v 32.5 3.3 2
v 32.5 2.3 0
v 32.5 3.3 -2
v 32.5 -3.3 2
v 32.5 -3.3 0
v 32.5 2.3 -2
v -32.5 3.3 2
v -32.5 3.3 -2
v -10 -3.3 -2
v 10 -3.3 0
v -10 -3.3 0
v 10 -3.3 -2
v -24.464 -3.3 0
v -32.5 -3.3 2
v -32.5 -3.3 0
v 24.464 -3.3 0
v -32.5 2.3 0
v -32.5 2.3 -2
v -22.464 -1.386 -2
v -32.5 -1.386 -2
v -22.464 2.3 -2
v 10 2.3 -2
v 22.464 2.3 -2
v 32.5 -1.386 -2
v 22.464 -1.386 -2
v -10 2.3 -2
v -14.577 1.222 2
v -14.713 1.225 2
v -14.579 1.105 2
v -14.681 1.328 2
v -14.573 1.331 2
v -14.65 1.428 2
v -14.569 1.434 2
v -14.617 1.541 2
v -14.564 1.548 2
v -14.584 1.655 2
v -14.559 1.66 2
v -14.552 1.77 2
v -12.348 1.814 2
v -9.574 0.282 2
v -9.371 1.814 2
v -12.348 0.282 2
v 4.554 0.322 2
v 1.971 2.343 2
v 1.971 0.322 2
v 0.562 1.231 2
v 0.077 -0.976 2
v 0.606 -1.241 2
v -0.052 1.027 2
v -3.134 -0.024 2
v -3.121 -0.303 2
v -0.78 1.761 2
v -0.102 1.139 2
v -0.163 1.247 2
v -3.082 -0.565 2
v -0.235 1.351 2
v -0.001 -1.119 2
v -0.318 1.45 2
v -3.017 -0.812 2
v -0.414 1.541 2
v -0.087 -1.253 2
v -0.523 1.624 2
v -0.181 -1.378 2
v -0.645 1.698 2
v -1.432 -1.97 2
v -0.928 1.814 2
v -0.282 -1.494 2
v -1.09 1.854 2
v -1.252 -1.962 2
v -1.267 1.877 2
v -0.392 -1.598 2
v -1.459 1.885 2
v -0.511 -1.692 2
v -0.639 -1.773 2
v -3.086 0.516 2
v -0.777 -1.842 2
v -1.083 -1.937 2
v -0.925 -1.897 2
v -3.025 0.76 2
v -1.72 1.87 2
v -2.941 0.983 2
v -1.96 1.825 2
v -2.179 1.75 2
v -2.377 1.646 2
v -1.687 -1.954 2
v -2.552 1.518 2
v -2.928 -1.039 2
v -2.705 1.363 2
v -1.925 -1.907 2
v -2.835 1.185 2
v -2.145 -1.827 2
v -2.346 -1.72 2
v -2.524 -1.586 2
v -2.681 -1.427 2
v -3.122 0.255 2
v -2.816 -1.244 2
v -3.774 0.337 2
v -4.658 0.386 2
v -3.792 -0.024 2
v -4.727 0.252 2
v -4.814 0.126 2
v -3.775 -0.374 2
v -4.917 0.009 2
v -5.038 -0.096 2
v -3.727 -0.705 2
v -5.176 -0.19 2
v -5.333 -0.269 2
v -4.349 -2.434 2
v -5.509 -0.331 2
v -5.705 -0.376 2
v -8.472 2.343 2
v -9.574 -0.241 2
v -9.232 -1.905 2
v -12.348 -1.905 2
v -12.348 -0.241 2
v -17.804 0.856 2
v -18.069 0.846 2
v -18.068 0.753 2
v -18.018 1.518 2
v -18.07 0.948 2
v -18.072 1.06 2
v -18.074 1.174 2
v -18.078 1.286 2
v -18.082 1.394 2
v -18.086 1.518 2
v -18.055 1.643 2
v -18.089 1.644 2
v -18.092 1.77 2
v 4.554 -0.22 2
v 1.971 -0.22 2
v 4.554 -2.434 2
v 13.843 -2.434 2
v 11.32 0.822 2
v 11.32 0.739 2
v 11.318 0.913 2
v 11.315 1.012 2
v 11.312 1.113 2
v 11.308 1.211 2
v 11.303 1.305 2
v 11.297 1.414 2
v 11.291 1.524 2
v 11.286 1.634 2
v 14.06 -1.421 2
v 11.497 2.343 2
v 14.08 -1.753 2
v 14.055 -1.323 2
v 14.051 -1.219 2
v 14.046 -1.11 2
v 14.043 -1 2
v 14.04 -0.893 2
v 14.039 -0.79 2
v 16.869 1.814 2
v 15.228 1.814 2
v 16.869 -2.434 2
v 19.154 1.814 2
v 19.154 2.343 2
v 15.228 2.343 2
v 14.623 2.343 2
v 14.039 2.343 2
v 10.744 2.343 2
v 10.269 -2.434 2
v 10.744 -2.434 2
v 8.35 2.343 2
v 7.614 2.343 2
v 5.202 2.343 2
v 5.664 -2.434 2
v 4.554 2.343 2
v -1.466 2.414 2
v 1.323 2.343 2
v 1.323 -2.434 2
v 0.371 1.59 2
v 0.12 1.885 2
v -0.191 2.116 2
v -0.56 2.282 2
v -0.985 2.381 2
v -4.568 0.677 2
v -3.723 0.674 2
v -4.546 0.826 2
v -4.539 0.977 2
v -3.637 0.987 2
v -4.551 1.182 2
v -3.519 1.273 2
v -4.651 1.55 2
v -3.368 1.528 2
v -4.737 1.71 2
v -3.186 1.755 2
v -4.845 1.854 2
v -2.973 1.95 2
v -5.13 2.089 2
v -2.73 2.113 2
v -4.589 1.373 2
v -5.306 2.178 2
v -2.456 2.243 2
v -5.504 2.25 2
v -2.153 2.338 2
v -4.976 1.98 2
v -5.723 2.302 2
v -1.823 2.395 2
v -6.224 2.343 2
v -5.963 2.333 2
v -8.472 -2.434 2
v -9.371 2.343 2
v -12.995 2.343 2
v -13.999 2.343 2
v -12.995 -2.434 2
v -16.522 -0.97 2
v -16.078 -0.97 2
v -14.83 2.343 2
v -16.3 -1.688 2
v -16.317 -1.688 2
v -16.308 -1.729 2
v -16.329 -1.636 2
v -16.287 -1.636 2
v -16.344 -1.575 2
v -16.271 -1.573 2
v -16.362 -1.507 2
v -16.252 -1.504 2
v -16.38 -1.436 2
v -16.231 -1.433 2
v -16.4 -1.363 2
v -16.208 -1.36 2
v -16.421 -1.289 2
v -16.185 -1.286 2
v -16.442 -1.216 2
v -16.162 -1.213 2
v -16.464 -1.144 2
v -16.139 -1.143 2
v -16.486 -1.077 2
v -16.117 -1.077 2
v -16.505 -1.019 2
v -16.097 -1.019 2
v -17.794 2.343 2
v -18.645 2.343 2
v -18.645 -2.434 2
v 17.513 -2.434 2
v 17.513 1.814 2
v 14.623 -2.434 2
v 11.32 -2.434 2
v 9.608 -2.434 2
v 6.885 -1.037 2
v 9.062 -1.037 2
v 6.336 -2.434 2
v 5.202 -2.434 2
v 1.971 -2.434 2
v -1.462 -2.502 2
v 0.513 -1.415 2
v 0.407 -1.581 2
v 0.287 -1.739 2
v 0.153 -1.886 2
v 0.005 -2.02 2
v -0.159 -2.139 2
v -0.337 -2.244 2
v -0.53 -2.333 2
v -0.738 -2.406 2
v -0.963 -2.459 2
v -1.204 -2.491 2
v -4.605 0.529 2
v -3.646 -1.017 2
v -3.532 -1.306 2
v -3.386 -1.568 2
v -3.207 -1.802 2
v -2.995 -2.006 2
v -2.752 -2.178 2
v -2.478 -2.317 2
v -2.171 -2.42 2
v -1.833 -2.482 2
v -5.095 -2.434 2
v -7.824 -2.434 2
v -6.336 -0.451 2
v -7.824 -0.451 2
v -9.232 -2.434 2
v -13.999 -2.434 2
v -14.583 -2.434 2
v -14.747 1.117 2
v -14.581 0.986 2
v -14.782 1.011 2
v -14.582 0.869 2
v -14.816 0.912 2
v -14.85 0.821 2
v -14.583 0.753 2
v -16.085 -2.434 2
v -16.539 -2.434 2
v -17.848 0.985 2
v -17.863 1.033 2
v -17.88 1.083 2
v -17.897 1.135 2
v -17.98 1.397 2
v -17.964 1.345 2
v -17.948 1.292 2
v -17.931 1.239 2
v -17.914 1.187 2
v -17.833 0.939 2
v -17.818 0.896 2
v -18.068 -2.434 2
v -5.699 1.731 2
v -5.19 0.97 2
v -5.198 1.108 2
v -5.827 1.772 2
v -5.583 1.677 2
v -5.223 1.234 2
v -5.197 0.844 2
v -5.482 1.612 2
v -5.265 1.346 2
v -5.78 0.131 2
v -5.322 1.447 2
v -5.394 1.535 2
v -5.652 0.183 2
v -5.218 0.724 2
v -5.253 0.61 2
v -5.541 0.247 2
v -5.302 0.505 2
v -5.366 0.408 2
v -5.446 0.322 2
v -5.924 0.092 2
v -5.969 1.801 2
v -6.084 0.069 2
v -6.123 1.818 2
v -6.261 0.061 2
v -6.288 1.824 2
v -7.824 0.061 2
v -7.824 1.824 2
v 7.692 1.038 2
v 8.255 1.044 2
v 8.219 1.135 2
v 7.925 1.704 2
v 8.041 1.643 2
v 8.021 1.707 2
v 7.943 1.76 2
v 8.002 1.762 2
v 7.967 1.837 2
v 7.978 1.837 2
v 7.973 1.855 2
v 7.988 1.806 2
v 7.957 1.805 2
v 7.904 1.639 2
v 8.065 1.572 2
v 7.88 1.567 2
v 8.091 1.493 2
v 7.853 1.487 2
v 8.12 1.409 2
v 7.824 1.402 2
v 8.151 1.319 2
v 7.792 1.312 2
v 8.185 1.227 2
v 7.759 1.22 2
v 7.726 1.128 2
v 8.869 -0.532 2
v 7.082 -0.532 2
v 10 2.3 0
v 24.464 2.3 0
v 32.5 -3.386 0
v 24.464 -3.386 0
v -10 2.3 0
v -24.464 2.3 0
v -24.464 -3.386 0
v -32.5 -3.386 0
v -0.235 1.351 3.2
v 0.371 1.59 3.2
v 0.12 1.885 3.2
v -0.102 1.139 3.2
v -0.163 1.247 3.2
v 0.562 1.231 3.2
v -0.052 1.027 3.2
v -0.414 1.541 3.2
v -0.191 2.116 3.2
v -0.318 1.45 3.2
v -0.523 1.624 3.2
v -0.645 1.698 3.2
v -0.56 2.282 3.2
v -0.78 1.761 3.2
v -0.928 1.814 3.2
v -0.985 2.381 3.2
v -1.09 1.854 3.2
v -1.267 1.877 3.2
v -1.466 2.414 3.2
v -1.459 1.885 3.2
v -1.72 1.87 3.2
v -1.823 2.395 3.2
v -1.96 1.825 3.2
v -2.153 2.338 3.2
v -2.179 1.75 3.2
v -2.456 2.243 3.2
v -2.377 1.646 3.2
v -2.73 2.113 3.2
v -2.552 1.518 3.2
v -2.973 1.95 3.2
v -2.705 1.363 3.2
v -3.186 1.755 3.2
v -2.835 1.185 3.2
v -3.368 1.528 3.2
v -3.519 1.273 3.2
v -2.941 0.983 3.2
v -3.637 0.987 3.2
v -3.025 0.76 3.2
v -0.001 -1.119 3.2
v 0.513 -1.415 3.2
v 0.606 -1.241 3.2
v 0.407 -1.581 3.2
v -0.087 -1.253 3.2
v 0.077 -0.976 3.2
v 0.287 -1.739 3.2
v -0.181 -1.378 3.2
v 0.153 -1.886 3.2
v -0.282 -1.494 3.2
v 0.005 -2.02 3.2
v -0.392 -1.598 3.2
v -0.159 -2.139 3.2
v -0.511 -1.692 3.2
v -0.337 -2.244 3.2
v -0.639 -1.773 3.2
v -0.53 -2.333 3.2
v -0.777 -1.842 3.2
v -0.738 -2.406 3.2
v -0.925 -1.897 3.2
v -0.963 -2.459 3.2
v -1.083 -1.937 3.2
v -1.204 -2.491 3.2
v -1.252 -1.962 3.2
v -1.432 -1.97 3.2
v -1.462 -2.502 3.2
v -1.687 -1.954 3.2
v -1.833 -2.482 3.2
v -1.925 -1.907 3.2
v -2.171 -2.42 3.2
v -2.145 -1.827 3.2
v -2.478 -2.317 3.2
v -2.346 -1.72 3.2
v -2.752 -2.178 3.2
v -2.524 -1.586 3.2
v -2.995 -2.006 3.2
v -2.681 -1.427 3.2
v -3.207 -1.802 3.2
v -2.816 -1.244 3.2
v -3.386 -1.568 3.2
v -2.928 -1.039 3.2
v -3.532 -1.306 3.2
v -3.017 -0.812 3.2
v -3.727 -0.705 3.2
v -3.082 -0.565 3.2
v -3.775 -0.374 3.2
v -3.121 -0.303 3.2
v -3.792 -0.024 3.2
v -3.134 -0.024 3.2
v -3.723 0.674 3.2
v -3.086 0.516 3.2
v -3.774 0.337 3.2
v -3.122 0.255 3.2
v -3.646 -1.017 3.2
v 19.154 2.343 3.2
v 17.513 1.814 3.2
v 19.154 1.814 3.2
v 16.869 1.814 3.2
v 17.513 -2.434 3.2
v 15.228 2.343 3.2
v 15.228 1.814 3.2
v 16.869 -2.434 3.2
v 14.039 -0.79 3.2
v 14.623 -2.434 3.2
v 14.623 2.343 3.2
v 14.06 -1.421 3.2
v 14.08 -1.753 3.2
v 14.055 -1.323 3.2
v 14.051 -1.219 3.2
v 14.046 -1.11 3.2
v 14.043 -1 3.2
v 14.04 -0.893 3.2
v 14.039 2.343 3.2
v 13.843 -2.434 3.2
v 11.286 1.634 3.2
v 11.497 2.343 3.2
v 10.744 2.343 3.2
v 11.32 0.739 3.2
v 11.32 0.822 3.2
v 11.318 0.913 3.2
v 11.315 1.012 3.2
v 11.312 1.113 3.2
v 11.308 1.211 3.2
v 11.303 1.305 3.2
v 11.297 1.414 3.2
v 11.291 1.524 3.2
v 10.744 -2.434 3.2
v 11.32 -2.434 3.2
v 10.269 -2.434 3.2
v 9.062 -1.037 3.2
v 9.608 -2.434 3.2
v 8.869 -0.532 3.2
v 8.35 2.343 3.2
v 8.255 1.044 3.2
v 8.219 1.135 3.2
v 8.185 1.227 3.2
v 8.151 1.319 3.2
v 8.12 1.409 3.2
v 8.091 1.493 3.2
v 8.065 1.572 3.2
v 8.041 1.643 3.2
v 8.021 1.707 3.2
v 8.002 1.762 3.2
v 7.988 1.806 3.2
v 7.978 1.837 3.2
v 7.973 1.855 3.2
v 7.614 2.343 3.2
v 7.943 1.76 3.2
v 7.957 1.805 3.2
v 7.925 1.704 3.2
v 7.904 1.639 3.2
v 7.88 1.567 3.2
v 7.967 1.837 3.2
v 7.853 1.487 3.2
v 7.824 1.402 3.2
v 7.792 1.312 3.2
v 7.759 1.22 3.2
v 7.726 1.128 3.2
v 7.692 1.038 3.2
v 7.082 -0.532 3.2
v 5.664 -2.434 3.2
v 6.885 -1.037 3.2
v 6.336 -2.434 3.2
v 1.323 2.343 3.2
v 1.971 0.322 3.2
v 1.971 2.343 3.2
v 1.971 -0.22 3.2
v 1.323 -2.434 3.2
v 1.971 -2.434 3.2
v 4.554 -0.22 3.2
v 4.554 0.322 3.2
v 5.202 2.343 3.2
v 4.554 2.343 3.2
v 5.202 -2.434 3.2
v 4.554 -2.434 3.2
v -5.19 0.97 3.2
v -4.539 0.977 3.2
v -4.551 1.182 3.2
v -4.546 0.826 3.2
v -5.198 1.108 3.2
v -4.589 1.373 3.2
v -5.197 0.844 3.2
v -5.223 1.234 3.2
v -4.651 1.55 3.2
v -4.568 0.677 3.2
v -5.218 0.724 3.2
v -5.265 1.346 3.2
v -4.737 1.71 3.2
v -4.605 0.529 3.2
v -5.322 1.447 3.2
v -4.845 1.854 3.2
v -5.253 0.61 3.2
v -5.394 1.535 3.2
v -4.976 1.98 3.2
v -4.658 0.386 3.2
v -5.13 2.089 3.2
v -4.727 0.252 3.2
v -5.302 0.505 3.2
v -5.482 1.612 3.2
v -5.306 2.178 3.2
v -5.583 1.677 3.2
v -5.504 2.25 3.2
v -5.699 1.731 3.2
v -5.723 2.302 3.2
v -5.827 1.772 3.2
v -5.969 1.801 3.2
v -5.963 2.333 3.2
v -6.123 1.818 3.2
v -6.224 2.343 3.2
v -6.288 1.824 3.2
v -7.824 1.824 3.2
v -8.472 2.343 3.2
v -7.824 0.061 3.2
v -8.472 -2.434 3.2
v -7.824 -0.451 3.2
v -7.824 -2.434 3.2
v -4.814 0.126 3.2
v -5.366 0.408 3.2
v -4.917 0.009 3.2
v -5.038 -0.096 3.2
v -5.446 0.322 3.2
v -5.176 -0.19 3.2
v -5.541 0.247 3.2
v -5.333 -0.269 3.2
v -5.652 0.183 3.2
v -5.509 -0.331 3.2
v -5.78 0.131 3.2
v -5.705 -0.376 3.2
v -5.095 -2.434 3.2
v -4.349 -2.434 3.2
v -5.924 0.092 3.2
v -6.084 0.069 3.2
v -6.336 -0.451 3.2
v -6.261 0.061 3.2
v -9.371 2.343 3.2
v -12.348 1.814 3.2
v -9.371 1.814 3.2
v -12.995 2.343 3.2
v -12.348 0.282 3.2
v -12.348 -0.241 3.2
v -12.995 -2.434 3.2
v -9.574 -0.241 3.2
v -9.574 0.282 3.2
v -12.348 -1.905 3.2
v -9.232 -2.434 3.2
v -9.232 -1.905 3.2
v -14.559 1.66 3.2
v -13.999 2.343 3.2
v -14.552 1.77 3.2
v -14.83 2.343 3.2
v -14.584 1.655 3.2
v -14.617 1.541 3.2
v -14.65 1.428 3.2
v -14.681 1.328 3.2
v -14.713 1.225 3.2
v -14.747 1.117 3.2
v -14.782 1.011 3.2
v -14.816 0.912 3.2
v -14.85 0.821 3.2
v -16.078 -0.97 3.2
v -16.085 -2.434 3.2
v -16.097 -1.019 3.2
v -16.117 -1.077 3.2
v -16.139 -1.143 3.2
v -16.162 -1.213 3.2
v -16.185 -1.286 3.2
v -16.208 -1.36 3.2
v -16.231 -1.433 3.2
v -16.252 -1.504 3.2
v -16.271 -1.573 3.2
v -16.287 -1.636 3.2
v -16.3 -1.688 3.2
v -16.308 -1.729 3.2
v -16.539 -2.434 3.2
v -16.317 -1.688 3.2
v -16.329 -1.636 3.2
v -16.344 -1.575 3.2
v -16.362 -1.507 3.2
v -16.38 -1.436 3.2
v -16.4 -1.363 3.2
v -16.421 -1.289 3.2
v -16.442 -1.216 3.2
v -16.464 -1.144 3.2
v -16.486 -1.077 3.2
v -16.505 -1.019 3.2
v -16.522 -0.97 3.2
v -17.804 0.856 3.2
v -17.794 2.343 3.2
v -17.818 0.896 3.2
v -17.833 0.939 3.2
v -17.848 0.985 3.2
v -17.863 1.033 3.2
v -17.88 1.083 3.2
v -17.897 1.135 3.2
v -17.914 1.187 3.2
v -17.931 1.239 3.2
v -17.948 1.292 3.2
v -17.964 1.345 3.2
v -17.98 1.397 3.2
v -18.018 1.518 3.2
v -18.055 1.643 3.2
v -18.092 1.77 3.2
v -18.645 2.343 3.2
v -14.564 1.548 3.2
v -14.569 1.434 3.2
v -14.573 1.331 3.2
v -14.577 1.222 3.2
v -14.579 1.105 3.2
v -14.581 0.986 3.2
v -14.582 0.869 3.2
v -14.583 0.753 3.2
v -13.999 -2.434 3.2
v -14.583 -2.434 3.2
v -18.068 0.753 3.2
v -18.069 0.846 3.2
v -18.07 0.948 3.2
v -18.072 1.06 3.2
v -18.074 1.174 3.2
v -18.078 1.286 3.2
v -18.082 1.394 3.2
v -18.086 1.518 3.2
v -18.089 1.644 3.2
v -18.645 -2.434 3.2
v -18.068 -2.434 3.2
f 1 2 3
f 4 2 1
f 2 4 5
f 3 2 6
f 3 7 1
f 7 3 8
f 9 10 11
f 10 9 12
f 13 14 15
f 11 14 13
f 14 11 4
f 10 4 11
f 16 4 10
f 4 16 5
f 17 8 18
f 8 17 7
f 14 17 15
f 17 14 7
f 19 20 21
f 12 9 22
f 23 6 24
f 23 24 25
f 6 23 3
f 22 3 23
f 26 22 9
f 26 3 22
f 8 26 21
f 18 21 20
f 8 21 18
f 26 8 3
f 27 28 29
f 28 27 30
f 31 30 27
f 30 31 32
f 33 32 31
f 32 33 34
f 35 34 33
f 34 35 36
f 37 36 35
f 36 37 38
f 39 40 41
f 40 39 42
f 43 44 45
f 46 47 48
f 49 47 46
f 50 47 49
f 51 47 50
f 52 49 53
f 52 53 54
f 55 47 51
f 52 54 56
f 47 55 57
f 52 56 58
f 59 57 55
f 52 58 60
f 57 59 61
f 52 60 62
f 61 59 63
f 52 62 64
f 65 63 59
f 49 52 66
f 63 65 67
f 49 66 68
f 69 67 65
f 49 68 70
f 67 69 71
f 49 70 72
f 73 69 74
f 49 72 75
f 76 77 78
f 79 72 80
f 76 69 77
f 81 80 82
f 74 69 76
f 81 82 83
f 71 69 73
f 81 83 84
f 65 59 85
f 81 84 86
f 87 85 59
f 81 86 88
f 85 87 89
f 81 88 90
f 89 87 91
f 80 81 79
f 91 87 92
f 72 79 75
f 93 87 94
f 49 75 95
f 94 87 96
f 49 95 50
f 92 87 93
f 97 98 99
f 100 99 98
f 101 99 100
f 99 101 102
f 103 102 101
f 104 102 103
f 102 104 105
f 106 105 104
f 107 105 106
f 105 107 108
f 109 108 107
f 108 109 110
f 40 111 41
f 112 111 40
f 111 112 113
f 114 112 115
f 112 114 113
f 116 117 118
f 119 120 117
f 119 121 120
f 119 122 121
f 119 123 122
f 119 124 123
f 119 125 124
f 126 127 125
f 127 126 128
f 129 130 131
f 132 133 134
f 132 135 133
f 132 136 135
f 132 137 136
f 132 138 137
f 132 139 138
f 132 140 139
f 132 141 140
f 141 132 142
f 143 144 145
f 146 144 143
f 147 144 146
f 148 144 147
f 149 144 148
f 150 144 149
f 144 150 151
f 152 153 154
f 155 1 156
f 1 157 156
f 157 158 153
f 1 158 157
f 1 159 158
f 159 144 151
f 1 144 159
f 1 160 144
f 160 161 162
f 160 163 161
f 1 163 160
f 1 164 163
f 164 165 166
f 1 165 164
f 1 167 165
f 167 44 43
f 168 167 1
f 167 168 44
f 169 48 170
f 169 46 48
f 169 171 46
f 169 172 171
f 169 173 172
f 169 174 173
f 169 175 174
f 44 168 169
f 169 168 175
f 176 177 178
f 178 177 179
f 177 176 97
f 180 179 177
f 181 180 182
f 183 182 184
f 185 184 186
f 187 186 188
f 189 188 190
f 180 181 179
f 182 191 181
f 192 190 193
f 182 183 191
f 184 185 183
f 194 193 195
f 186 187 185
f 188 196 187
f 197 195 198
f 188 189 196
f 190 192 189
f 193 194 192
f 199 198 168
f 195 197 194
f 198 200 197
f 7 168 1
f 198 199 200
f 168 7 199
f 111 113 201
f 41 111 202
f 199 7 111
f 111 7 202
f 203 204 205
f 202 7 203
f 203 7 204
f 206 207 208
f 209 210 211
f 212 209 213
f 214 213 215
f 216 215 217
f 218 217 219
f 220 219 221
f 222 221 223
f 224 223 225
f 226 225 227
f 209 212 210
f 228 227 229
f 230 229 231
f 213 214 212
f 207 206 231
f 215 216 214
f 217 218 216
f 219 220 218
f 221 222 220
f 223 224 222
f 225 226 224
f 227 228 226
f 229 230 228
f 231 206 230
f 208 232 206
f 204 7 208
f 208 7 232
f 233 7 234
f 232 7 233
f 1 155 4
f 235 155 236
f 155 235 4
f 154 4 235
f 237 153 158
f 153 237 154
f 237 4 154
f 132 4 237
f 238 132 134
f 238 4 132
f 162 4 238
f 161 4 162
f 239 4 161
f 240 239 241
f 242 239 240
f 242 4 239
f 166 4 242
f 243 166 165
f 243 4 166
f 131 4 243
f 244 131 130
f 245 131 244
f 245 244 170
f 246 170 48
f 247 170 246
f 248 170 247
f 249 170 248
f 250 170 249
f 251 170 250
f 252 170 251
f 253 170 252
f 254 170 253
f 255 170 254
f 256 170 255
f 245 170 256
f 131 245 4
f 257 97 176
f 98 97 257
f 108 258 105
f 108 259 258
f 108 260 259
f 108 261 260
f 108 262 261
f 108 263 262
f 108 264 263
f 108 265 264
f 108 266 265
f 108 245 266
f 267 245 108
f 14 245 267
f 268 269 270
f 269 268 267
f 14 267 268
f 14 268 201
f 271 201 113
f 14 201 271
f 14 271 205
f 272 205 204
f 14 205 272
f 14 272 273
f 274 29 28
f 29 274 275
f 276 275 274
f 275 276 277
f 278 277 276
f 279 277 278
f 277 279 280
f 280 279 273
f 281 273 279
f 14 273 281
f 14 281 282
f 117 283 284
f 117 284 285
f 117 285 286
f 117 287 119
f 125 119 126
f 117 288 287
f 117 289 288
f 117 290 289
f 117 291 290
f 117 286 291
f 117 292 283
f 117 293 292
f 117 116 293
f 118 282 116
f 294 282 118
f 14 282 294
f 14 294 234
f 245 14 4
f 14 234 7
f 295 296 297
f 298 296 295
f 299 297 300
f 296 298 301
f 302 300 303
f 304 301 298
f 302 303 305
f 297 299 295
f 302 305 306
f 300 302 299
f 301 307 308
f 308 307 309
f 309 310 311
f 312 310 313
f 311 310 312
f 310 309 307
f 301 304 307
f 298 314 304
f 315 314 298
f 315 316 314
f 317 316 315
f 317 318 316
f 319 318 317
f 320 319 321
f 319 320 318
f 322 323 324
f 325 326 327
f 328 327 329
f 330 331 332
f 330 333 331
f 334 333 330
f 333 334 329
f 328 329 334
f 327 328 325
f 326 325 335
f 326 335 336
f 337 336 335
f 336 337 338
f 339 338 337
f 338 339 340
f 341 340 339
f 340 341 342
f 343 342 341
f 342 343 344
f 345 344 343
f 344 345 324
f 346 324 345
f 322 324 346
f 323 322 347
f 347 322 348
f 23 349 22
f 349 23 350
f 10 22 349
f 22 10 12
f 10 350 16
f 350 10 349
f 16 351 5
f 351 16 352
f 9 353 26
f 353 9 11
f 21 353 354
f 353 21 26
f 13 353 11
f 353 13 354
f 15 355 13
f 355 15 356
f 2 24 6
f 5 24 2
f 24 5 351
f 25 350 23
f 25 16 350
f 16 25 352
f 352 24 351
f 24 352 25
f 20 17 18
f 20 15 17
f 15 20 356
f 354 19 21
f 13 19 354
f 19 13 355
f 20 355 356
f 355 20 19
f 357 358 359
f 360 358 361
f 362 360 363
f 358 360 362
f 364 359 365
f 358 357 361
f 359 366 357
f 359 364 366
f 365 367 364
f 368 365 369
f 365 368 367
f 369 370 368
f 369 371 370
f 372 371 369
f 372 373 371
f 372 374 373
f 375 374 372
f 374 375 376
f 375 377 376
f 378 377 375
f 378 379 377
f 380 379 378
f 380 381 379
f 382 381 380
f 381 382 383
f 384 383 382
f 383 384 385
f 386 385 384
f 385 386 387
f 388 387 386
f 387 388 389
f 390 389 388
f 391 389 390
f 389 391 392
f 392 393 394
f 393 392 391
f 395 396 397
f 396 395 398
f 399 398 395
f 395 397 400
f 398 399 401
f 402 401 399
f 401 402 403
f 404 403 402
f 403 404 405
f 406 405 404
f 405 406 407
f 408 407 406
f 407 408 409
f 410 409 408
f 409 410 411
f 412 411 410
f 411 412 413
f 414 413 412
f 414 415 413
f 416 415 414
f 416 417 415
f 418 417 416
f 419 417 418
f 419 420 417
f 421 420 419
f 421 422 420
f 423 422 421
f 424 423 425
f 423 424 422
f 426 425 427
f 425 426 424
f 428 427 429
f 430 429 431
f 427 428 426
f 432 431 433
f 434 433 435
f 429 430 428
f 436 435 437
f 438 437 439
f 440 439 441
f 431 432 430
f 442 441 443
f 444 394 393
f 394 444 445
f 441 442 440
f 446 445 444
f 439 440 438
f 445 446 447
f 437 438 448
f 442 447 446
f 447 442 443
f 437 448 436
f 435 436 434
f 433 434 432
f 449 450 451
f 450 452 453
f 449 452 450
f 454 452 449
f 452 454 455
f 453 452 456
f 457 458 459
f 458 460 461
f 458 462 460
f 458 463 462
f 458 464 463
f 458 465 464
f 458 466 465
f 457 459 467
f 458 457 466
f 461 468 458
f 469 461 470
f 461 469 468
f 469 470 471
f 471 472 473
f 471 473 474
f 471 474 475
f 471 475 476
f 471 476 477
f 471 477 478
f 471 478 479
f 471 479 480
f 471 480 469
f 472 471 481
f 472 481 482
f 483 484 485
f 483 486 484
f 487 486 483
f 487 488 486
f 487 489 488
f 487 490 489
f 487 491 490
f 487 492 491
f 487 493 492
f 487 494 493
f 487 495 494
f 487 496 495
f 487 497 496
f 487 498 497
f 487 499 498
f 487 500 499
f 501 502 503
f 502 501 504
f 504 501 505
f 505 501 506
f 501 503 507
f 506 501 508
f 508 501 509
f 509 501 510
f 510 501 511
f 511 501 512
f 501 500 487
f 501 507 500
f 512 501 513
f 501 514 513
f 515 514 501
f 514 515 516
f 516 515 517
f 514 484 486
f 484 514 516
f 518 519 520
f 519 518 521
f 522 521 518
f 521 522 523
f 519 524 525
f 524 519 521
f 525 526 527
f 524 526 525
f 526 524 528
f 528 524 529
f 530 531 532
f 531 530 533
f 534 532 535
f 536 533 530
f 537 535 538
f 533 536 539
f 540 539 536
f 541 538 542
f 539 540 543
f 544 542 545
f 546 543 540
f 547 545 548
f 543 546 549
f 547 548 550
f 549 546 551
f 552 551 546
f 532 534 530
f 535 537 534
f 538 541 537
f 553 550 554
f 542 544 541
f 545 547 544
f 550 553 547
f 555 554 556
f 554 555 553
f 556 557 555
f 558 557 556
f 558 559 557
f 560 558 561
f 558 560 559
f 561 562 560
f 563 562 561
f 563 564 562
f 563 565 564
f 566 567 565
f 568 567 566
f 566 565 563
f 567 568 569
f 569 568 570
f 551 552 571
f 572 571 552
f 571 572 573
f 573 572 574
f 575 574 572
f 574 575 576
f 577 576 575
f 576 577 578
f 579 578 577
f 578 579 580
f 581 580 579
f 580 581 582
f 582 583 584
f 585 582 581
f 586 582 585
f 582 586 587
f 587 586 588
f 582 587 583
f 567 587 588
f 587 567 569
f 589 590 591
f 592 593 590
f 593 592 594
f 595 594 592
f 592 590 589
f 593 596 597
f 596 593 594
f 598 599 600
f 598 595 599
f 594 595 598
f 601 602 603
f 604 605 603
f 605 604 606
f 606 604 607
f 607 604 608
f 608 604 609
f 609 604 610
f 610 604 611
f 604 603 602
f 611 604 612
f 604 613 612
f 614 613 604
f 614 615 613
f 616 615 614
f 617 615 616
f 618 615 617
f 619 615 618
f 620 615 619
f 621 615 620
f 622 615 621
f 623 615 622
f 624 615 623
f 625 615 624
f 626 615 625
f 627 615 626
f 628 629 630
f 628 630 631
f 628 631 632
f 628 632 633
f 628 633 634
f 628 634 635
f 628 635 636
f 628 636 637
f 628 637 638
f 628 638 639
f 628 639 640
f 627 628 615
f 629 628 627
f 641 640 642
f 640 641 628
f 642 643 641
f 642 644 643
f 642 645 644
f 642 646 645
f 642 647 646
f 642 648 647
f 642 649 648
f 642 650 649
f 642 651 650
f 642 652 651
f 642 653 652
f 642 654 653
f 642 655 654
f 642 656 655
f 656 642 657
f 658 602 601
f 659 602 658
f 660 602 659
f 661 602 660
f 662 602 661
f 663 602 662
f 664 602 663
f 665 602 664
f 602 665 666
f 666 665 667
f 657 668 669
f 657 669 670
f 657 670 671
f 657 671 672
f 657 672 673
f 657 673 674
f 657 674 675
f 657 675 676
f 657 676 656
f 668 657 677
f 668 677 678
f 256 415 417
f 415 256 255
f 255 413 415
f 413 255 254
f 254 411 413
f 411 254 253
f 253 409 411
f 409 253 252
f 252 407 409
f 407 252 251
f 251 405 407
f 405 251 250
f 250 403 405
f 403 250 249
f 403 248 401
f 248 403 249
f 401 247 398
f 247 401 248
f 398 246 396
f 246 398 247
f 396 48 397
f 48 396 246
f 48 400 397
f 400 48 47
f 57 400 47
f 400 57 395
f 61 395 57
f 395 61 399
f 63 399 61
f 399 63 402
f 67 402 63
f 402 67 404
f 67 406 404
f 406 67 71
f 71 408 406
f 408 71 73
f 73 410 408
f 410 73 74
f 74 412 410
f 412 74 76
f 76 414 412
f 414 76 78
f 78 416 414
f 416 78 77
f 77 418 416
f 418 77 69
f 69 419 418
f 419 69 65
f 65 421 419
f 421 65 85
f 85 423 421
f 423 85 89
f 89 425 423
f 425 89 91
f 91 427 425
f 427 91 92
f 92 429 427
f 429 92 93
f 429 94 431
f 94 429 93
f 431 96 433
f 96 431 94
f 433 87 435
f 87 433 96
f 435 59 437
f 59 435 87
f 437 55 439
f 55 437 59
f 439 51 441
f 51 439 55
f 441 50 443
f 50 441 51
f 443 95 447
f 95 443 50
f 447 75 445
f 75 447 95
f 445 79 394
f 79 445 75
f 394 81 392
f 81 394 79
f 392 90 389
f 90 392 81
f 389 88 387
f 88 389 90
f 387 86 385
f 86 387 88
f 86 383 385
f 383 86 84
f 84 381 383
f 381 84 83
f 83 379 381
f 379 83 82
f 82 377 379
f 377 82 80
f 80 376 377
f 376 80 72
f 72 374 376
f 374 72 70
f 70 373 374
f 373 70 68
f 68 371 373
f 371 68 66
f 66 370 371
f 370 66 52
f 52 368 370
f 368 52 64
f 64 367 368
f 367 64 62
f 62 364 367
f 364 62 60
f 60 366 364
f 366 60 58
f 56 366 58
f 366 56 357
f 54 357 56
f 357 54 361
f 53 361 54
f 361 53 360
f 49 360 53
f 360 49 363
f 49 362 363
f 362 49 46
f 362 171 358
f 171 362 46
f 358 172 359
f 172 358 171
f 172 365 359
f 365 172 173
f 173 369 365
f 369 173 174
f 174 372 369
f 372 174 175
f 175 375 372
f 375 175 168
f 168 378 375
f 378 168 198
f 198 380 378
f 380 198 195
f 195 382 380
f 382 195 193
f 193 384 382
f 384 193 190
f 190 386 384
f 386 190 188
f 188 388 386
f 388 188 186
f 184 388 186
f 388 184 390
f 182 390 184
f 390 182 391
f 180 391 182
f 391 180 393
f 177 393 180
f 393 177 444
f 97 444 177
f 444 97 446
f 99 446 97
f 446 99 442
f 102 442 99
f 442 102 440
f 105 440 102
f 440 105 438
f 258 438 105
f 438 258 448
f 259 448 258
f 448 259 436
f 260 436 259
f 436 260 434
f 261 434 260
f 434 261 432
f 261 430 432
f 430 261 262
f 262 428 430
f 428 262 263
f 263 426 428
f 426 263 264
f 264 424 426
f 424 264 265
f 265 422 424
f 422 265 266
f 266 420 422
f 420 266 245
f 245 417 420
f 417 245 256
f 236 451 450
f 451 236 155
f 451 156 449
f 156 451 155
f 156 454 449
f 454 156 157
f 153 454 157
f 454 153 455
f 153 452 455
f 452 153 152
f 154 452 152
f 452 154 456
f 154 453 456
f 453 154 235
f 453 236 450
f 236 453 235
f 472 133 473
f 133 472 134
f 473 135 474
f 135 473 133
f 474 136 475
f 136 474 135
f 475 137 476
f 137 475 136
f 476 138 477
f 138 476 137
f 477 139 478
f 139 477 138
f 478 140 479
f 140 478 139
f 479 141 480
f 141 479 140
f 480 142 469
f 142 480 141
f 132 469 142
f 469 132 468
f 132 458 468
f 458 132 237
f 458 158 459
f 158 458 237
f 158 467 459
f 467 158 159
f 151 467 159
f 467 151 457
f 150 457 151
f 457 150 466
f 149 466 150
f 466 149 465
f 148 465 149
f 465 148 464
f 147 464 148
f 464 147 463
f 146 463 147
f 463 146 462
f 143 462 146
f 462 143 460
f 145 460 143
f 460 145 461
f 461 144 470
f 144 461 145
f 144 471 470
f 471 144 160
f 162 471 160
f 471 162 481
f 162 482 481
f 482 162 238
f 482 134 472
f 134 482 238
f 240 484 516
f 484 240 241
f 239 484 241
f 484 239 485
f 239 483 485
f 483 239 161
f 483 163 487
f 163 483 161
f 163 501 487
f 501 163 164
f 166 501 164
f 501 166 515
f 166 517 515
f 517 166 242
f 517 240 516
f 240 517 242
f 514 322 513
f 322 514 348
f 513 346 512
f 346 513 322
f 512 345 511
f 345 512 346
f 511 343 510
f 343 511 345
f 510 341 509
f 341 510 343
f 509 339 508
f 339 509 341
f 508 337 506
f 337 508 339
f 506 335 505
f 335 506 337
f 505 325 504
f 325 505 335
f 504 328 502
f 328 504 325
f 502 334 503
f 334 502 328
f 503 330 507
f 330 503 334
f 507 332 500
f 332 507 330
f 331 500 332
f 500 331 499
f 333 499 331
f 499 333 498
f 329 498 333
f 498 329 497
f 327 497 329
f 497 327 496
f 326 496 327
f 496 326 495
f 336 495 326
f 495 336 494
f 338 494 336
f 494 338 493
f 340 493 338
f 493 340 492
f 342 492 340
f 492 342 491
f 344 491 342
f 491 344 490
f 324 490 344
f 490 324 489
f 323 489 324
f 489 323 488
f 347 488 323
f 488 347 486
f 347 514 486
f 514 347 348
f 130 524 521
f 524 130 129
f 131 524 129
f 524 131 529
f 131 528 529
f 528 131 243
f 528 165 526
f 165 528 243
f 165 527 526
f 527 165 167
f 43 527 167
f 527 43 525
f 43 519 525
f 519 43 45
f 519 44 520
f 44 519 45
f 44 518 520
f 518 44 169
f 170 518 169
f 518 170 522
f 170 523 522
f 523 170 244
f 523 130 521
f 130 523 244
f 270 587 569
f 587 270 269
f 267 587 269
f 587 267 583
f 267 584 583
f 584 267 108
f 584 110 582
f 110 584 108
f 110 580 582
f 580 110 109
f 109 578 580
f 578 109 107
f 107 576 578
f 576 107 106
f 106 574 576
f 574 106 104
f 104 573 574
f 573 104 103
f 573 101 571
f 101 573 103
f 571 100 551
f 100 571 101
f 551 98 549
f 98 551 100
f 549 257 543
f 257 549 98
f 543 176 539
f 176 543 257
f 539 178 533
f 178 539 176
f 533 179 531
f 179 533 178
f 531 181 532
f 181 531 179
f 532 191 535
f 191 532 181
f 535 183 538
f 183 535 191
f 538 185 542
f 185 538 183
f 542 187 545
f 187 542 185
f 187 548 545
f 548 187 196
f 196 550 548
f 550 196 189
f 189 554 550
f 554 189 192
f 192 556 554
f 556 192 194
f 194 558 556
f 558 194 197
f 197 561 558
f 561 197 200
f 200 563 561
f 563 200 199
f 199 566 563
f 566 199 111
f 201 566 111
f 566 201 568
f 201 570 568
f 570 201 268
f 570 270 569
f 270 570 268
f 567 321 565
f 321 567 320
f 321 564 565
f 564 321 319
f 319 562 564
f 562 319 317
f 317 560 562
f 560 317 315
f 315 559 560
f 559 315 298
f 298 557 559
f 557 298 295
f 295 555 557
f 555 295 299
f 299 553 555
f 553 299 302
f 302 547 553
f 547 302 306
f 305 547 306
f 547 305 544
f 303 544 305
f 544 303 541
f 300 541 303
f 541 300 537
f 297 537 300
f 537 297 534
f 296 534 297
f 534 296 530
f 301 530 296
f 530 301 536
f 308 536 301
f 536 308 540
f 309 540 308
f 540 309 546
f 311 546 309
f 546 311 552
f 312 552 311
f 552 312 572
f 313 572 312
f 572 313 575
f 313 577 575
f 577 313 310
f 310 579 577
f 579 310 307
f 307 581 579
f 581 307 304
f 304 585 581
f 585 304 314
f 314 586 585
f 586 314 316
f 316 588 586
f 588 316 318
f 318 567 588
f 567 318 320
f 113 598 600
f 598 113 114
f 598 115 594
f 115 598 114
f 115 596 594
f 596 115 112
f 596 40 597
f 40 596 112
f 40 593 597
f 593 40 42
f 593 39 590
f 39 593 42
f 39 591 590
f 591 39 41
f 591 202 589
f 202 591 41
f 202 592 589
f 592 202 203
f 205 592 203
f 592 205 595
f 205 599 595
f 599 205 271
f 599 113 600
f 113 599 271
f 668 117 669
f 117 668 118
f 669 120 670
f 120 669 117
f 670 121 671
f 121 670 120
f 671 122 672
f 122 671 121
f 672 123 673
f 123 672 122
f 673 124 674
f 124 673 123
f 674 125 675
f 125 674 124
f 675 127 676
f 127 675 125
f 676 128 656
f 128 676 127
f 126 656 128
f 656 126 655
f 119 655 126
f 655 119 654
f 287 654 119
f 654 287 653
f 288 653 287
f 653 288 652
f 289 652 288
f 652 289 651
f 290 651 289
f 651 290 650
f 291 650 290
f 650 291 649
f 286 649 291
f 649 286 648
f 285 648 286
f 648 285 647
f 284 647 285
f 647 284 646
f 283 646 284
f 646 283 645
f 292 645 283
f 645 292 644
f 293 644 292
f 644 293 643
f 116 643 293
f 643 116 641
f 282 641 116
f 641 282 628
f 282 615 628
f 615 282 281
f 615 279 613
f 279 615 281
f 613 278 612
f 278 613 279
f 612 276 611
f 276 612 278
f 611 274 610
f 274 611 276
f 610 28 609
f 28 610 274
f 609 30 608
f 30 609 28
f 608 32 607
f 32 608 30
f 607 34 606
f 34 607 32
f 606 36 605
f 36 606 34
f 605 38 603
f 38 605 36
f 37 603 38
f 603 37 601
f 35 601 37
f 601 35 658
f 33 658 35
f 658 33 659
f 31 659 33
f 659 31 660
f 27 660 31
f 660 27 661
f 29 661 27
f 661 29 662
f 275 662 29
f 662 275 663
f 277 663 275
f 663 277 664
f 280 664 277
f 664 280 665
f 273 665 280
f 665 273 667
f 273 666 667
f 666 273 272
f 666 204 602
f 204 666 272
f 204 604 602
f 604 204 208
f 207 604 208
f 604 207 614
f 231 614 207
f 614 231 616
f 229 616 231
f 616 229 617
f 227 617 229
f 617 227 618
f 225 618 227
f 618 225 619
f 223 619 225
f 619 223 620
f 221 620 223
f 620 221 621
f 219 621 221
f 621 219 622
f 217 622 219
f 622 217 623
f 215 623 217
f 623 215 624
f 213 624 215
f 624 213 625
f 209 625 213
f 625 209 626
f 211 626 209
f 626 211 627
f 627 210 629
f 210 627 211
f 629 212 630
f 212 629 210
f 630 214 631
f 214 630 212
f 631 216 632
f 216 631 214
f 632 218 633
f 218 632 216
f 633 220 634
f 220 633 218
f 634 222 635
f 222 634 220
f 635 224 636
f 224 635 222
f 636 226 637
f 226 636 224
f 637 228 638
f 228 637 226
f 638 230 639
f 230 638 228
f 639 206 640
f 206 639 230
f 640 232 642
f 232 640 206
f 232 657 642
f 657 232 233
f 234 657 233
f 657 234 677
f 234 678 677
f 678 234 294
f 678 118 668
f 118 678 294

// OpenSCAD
/*
  cardSizes

  TicketToRide
  43.44 x 67.51 x 0.25

  Dominion
  58.95 x 90.83 x 0.3

  Catan
  54.2 x 80.2 x 0.3
    
  Power Grid Money
  45 x  90 x 0.1
    
  Power Grid Plants
  70 x 70 x 0.25
*/

//item = "tray"; // [tray,lid,divider]
// if using sleeves, this will be the sleeve width
cardWidth = 59;
// additional space around the card, 2 is 1mm at each end
xySpace = 2;
// this can be tailored based on your printer. A figure of zero essentially means that the points at the end of the interlocking system should exactly touch, so we need to push them together to create a lock. A more accurate printer should permit this figure to get close to the precise figure of -2.
interlockClearance = -1.2;
// another locking clearance parameter, this time for the top/bottom interlock. a typical feature of 3D printing is that the bottom layer is a touch larger than the rest in order to create good bed adhesion, in this case, removing a small sliver from the locking mechanism helps top/bottom stacking to happen cleanly without giving rise to bending trays. You'll tailor this based on your experience with your own printer.
topBottomInterlockClearance = 0.7;
// Text to put on nameplate
label="MERCHANT";



module lock(length,rX,rY,rZ,bcR) {
     translate([0,0,(0.25*10+2.5+1.1)/2])
	  difference() {
	  rotate([rX,rY,rZ])
	       difference() {
	       cube([2,length-interlockClearance,0.25*10+2.5+1.1],center=true);
	       translate([0,(length-interlockClearance)/2,0])
		    rotate([0,0,45])
		    cube([2,length-interlockClearance,0.25*10+2.5+1.2],center=true);
	  };
	  translate([0,0,-(0.25*10+2.5+1.1)/2])
	       rotate([rX,rY,rZ])
	       rotate([0,bcR,0])
	       cube([2,length+0.1-interlockClearance,0.25*10+2.5+1.2],center=true);
     }
}


endLength = cardWidth+xySpace+4;

module nameplate2() {
    length = endLength/2-14;
	centerSupport=20;
	endCubeLength=(endLength-centerSupport)/2;

    rotate([-90,0,0]) {
		difference() {
			cube([endLength,4,6.6],center=true);
			translate([(endCubeLength+centerSupport)/2,1.25,-0.5]) {
				cube([endCubeLength,2.5,5.6],center=true);
			}
			translate([-(endCubeLength+centerSupport)/2,1.25,-0.5]) {
				cube([endCubeLength,2.5,5.6],center=true);
			}
		}
		translate([-(length/4 - endLength/2 - interlockClearance/2),
				1.0,-3.8]) 
			lock(length/2,0,180,90,45);
		translate([(length/4 - endLength/2 - interlockClearance/2),
			1.0,-3.8])
			lock(length/2,0,0,270,-45);

		font1="Liberation Sans";
		translate([0,-1,-0.1]) {
			rotate([90,0,0]){
				linear_extrude(height=2.2){
					text(label,halign="center",valign="center",font=font1,size=5,direction="ltr",spacing=1);
				}
			}
		}
	}
}

	
					
	
nameplate2();
